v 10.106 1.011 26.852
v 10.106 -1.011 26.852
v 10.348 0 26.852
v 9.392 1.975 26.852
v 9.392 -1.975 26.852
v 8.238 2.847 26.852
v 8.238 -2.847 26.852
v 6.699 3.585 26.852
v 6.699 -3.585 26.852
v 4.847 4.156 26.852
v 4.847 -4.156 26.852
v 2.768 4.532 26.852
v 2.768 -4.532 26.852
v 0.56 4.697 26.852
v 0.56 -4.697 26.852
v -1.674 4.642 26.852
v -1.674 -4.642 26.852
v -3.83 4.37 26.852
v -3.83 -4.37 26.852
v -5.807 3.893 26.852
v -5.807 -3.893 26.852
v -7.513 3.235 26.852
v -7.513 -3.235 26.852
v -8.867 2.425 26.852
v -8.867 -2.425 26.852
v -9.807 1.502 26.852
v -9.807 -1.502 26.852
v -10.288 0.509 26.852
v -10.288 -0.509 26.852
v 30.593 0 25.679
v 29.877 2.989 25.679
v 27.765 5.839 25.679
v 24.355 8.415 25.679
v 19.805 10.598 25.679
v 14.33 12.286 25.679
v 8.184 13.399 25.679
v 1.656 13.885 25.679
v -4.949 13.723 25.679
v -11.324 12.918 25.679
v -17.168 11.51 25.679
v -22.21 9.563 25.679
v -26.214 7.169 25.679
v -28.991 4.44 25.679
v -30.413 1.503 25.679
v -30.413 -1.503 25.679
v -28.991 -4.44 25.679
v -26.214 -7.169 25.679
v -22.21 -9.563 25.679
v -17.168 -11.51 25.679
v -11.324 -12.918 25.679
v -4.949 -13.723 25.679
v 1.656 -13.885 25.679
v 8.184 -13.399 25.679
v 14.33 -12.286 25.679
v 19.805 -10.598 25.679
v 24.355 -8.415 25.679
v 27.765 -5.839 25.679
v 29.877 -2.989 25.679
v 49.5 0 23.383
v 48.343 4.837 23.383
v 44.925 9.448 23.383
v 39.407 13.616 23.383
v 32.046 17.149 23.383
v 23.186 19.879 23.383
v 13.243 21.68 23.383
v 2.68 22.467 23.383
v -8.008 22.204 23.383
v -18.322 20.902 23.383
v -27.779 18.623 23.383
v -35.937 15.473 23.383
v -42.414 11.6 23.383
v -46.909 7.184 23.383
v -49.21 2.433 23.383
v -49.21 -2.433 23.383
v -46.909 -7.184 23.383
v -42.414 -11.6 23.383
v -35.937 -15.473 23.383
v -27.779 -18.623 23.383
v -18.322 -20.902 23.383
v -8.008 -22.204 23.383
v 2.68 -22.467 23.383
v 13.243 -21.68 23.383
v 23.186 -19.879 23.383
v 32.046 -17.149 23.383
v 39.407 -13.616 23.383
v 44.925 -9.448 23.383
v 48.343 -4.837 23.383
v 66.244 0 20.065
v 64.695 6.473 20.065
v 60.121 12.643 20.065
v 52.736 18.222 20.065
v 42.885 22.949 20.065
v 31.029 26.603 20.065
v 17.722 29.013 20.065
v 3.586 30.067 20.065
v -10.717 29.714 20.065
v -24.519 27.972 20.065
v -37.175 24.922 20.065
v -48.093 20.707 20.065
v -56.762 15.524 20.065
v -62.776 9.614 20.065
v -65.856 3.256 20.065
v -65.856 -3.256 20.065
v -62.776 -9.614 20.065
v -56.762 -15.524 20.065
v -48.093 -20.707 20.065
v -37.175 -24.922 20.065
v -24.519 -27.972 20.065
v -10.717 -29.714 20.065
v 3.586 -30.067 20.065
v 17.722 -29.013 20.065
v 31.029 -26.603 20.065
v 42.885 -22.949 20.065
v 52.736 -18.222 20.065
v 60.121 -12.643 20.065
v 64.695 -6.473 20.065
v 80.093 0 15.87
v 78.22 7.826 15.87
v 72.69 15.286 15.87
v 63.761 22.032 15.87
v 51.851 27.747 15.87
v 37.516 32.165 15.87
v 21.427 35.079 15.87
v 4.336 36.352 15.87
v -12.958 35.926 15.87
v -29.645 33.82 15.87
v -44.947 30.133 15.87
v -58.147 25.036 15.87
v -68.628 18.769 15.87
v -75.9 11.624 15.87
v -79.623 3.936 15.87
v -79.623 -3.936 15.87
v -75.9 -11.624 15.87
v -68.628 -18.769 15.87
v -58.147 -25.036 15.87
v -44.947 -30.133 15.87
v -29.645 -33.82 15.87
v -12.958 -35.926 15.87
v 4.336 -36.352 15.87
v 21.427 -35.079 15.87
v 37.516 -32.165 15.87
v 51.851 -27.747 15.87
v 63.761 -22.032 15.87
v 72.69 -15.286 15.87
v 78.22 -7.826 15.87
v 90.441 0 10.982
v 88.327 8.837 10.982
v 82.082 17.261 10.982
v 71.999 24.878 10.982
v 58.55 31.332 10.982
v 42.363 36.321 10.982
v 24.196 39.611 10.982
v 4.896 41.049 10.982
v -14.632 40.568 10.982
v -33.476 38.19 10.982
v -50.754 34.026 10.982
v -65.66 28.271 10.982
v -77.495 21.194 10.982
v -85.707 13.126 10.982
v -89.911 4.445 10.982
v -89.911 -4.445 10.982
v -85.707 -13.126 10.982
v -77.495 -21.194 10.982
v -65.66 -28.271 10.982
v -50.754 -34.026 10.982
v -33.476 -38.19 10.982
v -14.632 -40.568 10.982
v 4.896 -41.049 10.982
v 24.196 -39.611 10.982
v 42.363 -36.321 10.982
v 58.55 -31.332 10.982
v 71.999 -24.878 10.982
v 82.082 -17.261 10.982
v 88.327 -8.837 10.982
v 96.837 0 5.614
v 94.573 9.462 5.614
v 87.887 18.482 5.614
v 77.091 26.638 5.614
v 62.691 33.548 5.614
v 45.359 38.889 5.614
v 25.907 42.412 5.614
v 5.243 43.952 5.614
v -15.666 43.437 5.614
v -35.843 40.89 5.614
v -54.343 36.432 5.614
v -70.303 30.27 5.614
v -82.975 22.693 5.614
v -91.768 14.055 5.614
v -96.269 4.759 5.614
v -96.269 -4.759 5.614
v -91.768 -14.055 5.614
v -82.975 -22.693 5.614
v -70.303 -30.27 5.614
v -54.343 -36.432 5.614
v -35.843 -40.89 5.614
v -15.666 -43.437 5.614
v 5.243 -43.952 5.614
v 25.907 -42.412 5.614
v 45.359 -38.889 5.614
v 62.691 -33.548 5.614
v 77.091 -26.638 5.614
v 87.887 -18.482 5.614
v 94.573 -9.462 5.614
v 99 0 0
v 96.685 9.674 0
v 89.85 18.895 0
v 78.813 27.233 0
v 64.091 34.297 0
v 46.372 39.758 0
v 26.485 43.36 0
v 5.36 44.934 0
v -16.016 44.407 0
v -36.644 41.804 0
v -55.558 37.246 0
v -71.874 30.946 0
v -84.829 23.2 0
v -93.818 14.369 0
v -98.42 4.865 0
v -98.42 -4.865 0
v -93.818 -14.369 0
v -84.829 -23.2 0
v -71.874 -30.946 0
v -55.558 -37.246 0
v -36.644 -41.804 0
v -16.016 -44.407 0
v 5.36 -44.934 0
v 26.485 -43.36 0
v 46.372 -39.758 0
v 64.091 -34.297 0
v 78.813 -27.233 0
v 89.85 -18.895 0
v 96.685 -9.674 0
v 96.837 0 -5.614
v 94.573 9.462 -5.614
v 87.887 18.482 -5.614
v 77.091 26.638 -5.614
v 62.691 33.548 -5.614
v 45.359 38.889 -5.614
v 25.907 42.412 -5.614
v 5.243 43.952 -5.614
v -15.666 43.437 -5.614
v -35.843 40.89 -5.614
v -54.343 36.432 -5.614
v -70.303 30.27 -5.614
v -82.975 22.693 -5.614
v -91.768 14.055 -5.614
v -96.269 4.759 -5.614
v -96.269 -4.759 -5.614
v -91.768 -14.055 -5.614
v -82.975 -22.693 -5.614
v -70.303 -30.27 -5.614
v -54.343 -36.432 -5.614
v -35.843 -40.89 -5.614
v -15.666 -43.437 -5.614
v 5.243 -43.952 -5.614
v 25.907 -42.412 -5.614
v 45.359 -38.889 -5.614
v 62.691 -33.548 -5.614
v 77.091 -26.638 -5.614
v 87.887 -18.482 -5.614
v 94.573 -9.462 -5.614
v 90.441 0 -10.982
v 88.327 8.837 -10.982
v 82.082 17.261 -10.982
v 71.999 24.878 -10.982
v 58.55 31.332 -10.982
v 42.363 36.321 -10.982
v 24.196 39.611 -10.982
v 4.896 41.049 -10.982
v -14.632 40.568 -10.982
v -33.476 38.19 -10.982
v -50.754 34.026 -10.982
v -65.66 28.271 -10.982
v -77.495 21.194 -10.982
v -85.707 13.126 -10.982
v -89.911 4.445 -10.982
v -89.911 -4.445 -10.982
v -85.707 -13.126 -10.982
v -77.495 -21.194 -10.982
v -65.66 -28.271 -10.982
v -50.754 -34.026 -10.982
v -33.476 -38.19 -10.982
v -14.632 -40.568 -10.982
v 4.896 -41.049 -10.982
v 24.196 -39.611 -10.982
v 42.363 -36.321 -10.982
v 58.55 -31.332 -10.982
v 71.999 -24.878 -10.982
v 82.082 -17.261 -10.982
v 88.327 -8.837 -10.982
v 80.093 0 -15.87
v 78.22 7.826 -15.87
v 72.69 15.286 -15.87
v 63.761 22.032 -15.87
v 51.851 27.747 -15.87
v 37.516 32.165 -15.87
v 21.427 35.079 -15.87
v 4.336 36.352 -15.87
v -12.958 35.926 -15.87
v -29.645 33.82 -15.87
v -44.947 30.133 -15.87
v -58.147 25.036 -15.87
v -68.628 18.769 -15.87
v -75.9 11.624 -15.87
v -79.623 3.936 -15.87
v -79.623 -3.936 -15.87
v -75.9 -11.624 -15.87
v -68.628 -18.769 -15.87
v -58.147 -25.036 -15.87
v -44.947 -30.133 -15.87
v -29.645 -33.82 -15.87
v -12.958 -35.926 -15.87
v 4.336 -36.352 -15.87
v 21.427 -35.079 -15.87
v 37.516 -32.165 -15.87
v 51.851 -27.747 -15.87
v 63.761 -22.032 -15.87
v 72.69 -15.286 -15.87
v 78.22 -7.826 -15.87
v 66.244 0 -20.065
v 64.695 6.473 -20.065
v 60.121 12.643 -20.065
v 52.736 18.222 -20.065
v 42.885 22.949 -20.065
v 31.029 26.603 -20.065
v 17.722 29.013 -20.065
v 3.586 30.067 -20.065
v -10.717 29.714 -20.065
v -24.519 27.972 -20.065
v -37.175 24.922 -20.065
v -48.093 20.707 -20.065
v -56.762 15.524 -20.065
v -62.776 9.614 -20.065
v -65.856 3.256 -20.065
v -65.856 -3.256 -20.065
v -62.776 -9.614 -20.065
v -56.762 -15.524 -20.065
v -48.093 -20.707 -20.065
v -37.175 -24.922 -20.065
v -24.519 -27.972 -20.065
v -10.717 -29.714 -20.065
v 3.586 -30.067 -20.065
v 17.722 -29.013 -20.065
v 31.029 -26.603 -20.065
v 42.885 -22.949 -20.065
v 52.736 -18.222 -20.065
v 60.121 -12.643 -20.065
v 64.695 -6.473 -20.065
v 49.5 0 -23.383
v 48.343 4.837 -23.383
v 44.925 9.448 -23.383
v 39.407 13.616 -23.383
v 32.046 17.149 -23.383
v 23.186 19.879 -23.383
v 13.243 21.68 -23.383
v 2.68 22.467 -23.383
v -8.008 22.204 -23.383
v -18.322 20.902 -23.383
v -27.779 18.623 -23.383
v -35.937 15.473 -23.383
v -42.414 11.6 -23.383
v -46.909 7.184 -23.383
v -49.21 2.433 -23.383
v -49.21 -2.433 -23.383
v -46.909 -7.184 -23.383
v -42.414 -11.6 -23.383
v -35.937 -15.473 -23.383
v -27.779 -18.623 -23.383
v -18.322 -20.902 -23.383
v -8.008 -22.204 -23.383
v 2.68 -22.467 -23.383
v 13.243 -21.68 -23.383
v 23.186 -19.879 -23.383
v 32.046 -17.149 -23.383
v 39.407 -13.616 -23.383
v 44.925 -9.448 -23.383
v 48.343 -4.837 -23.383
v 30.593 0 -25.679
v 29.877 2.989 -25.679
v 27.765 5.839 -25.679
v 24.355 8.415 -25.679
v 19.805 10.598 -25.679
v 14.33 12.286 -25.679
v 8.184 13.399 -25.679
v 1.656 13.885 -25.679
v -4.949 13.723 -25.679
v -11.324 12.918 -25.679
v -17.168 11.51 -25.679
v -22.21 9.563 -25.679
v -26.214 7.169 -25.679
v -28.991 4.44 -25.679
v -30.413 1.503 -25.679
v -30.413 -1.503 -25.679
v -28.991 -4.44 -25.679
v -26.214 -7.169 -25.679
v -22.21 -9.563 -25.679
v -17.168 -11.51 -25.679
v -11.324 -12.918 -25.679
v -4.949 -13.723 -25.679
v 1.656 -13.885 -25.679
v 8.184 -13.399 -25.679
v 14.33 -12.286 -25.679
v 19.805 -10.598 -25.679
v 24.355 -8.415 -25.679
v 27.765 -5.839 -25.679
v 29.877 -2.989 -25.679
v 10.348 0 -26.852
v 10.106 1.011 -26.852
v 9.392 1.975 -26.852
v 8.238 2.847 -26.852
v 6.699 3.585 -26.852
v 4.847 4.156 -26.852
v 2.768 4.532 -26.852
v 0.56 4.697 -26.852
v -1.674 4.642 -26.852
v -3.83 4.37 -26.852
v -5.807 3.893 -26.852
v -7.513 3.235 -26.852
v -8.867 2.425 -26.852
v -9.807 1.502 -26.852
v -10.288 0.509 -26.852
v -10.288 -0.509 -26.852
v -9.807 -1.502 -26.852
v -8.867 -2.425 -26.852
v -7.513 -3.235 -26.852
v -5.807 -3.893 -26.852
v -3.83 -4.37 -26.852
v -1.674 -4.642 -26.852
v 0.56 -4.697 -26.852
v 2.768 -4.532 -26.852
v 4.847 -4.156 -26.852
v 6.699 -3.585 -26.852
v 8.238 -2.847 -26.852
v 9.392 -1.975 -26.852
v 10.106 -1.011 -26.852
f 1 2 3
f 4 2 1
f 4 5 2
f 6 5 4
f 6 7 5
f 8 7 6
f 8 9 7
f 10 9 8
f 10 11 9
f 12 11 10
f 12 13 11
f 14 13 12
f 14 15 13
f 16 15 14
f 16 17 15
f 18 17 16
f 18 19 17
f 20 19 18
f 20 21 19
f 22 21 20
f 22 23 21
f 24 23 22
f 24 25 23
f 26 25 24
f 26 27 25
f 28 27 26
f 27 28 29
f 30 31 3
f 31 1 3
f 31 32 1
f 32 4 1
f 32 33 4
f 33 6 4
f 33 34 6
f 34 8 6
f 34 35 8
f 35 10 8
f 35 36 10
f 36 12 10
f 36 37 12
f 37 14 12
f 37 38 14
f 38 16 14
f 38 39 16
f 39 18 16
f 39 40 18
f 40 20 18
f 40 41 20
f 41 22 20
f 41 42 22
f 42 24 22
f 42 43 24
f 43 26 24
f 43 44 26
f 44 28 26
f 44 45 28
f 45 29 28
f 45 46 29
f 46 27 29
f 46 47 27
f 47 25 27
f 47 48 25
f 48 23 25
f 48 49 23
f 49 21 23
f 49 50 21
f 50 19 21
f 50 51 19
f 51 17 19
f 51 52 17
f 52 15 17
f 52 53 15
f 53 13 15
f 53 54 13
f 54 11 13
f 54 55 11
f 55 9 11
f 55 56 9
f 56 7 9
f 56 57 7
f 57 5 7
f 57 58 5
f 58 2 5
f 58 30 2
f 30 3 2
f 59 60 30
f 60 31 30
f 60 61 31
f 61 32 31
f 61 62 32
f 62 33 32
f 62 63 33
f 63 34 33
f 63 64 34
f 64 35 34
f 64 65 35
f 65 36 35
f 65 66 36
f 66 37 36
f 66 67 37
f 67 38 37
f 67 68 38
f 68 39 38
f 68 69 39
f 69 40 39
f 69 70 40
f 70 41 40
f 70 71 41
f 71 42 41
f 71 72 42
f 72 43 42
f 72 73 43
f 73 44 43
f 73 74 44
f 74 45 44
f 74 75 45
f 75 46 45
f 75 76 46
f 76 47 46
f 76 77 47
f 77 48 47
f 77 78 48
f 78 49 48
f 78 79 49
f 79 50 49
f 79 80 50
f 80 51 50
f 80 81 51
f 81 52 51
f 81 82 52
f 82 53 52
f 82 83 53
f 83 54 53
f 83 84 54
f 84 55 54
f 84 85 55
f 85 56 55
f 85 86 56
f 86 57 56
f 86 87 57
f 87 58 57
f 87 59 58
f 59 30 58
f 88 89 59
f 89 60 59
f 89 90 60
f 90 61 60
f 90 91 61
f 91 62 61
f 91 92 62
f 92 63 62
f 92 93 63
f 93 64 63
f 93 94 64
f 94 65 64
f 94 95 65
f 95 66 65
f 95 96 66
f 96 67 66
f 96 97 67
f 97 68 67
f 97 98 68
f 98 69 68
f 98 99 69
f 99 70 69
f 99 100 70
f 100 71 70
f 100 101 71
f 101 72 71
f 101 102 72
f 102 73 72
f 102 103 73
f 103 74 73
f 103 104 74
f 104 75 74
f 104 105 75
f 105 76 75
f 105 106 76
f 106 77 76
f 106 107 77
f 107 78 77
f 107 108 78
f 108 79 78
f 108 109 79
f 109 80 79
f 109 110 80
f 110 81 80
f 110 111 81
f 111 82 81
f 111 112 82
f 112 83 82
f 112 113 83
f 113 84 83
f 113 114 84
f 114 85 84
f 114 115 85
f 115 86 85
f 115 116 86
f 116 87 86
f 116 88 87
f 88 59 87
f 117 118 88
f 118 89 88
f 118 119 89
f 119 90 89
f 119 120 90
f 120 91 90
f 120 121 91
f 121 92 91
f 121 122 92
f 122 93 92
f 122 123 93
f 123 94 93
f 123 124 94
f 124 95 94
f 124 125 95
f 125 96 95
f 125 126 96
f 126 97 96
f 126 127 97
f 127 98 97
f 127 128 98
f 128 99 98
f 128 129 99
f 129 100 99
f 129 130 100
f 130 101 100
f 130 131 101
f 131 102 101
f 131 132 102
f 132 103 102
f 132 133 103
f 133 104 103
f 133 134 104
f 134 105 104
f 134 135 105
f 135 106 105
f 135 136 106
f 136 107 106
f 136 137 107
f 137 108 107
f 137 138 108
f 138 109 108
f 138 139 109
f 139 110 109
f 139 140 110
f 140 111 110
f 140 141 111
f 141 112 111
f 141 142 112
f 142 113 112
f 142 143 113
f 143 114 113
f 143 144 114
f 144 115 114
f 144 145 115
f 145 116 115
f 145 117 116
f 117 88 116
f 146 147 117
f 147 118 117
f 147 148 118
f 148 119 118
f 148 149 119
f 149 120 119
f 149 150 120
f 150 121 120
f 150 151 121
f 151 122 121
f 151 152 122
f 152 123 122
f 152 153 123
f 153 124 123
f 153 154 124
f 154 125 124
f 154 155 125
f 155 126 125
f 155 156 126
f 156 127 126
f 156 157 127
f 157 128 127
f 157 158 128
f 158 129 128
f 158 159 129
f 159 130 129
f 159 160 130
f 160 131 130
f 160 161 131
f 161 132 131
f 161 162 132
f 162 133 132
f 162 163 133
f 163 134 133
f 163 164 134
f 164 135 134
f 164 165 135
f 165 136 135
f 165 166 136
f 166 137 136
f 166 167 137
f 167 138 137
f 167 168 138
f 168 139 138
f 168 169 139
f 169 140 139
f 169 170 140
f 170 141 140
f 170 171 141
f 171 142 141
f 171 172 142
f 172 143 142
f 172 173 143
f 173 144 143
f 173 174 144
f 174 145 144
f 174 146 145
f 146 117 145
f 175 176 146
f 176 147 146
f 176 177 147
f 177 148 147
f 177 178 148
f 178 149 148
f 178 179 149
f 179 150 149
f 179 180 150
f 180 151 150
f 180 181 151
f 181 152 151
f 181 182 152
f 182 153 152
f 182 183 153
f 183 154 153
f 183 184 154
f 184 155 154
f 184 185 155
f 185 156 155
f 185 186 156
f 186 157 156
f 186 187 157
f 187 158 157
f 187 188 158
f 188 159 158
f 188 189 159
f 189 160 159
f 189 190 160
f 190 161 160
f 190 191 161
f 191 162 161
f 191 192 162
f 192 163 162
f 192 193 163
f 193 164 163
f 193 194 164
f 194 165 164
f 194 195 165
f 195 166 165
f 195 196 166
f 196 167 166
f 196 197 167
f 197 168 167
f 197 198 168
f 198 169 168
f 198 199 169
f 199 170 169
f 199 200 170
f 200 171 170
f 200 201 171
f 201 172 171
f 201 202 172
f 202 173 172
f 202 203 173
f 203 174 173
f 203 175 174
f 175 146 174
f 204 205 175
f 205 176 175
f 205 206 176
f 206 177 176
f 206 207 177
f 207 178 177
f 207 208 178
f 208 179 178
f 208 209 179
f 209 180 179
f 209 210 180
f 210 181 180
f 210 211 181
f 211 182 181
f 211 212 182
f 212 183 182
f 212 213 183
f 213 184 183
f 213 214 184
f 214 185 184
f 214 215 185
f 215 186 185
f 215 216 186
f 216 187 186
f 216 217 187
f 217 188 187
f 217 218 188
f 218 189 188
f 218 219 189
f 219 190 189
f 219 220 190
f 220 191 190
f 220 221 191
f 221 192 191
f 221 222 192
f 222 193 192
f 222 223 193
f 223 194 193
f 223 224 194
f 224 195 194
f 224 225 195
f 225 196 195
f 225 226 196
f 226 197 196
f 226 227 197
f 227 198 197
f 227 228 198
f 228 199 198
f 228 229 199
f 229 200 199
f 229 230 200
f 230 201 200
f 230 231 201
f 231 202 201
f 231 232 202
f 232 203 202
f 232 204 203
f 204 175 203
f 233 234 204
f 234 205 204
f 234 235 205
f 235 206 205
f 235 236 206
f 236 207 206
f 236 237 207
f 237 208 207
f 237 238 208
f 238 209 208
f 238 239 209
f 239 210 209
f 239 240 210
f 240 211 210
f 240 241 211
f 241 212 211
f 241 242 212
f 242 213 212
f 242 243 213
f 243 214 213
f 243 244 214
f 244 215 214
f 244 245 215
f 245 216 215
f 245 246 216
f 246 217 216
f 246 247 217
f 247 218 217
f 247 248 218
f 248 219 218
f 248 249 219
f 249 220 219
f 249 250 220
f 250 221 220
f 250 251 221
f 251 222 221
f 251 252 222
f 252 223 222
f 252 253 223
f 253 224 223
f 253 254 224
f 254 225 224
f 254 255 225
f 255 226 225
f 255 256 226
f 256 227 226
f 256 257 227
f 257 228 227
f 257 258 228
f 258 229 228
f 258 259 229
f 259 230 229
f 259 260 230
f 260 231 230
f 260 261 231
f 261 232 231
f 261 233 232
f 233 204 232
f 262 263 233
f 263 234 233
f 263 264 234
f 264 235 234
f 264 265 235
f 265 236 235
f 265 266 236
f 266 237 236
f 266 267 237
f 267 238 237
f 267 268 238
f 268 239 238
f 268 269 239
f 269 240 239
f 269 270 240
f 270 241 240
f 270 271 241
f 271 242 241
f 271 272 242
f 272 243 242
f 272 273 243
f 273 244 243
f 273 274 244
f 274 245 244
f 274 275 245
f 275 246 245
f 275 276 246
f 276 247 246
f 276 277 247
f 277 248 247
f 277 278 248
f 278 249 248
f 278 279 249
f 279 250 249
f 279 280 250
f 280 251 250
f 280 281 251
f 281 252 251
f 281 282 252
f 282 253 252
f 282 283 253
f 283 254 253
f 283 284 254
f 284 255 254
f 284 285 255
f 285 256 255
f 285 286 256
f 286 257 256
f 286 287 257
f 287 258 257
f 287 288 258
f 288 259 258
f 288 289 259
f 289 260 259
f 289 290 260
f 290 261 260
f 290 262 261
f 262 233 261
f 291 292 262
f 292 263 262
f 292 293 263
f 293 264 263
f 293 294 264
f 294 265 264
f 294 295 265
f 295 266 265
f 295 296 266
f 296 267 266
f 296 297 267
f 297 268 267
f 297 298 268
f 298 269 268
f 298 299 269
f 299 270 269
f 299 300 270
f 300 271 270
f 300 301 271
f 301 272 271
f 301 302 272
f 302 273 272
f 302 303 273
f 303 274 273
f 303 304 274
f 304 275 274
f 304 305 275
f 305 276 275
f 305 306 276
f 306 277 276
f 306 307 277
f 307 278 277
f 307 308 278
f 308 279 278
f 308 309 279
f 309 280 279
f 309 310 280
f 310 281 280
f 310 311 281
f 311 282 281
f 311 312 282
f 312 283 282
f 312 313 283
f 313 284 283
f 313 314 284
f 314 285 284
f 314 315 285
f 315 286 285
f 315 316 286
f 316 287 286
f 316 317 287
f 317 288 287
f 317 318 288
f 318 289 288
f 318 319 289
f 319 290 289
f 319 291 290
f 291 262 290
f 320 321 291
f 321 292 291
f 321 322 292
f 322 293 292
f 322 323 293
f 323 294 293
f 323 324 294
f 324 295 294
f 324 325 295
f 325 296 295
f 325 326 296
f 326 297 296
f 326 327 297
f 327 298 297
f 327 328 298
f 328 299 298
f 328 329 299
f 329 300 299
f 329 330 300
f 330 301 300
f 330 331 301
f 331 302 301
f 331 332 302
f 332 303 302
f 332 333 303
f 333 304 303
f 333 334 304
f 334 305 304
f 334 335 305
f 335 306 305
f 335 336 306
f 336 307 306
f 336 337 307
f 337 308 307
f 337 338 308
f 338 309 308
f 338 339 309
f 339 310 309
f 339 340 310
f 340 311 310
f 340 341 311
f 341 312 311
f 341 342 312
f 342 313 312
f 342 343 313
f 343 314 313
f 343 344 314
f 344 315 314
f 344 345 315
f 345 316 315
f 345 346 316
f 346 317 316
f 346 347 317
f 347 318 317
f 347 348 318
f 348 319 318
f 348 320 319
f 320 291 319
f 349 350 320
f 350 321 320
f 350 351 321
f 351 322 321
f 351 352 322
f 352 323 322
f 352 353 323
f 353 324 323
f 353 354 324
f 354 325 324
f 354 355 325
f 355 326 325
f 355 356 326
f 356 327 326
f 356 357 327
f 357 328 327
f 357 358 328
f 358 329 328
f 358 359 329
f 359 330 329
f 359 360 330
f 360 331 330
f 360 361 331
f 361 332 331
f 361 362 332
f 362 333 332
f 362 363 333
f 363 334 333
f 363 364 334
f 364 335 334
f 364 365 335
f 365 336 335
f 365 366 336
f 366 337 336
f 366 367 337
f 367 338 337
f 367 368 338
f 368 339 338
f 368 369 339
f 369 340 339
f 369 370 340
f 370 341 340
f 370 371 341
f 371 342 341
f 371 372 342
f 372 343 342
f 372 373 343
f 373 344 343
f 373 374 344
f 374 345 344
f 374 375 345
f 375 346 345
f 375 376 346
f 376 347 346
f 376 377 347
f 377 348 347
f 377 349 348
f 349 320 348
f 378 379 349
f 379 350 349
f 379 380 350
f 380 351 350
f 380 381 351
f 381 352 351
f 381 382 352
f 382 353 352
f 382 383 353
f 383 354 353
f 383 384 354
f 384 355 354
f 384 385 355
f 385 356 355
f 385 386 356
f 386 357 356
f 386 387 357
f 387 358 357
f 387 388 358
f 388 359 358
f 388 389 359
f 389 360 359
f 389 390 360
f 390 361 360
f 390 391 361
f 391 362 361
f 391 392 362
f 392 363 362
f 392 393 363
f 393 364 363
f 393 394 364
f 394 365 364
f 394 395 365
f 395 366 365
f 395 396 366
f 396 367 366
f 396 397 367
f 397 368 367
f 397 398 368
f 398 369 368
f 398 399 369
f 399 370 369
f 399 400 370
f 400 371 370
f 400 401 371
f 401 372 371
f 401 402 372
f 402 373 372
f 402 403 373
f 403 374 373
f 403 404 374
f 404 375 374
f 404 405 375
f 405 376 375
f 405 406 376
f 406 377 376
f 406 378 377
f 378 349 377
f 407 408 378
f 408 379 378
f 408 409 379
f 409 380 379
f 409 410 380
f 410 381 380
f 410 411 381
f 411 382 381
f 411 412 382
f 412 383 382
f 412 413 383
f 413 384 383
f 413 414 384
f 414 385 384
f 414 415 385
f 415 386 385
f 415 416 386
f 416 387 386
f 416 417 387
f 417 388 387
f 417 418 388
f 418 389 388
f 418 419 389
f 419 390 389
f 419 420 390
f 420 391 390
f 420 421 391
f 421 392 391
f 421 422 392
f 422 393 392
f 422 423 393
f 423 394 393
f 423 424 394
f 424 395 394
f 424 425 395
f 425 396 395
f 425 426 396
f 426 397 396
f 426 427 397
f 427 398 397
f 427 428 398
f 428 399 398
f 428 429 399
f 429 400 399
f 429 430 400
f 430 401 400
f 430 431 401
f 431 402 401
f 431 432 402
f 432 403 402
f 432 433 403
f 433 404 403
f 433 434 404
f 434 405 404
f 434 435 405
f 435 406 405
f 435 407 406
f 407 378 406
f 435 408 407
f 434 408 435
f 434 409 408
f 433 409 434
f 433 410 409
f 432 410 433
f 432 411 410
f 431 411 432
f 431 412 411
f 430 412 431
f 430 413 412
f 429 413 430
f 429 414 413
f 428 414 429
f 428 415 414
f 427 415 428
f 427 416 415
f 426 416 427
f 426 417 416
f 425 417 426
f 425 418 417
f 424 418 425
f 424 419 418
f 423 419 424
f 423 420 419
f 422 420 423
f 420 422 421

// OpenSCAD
// Generated by SolidPython 1.0.1 on 2020-07-29 00:46:49


scale(v = [11, 5, 3]) {
	sphere(r = 9);
}
/***********************************************
*********      SolidPython code:      **********
************************************************
 
# import packages: SolidPython
from solid import *
from solid.utils import *
from itertools import chain, combinations, permutations


class Resize:

    def __init__(self, scad_file):
        self.scad_file = scad_file
        #self.scad_file = import_scad(scad_file)
        # cone/cylinder param:
        self.r1 = 0
        self.r2 = 0
        self.h = 0
        # rectangular prism param:
        self.w = 0
        self.l = 0
        # ellipse param:
        self.r = 0

    # import OpenScad code (file name corresponds to shape)


    # classify shape + parameters
    def assign(self, param1, param2, param3):
        if self.scad_file == 'cone.scad':
            self.r1 = param1
            self.r2 = param2
            self.h = param3
        elif self.scad_file == 'cylinder.scad':
            self.r1 = param1
            self.r2 = param2
            self.h = param3
        elif self.scad_file == 'rectangularPrism.scad':
            self.h = param1
            self.l = param2
            self.w = param3
        else:
            self.r = param1
            self.h = param2

    # resize parameters
    def iterate(self):
        x = range(3, 20, 2)
        i = 1
        if self.scad_file == 'cone.scad':
            tempList = list(permutations(x, 2))
            for temp in tempList:
                param1 = temp[0]
                param2 = temp[1]
                filepath = 'produced_scad_files/' + 'cone' + str(param1) + '_' + str(param2) + '_' + '.scad'
                scad_render_to_file(cylinder(h=param1, r1=param2, r2=0), filepath)

        elif self.scad_file == 'cylinder.scad':
            tempList = list(permutations(x, 3))
            for temp in tempList:
                param1 = temp[0]
                param2 = temp[1]
                filepath = 'produced_scad_files/' + 'cylinder' + str(param1) + '_' + str(param2) + '_' + '.scad'
                scad_render_to_file(cylinder(h=param1, r1=param2, r2=param2), filepath)

        elif self.scad_file == 'rectangularPrism.scad':
            tempList = list(permutations(x, 3))
            for temp in tempList:
                param1 = temp[0]
                param2 = temp[1]
                param3 = temp[2]
                filepath = 'produced_scad_files/' + 'rectangularPrism' + str(param1) + '_' + str(param2) + '_' + str(
                    param3) + '.scad'
                scad_render_to_file(cube(size=(param1, param2, param3)), filepath)

        elif self.scad_file == 'ellipse.scad':
            tempList = list(permutations(x, 4))
            for temp in tempList:
                param1 = temp[0]
                param2 = temp[1]
                param3 = temp[2]
                param4 = temp[3]
                filepath = 'produced_scad_files/' + 'ellipse' + str(param1) + '_' + str(param2) + '_' + str(param3) + '_' + str(param4) + '.scad'
                scad_render_to_file(scale([param1, param2, param3])(sphere(r=param4)), filepath)

    def render_to_scadfile(self):
        scad_render_to_file(scad, 'example.scad') 
 
************************************************/
